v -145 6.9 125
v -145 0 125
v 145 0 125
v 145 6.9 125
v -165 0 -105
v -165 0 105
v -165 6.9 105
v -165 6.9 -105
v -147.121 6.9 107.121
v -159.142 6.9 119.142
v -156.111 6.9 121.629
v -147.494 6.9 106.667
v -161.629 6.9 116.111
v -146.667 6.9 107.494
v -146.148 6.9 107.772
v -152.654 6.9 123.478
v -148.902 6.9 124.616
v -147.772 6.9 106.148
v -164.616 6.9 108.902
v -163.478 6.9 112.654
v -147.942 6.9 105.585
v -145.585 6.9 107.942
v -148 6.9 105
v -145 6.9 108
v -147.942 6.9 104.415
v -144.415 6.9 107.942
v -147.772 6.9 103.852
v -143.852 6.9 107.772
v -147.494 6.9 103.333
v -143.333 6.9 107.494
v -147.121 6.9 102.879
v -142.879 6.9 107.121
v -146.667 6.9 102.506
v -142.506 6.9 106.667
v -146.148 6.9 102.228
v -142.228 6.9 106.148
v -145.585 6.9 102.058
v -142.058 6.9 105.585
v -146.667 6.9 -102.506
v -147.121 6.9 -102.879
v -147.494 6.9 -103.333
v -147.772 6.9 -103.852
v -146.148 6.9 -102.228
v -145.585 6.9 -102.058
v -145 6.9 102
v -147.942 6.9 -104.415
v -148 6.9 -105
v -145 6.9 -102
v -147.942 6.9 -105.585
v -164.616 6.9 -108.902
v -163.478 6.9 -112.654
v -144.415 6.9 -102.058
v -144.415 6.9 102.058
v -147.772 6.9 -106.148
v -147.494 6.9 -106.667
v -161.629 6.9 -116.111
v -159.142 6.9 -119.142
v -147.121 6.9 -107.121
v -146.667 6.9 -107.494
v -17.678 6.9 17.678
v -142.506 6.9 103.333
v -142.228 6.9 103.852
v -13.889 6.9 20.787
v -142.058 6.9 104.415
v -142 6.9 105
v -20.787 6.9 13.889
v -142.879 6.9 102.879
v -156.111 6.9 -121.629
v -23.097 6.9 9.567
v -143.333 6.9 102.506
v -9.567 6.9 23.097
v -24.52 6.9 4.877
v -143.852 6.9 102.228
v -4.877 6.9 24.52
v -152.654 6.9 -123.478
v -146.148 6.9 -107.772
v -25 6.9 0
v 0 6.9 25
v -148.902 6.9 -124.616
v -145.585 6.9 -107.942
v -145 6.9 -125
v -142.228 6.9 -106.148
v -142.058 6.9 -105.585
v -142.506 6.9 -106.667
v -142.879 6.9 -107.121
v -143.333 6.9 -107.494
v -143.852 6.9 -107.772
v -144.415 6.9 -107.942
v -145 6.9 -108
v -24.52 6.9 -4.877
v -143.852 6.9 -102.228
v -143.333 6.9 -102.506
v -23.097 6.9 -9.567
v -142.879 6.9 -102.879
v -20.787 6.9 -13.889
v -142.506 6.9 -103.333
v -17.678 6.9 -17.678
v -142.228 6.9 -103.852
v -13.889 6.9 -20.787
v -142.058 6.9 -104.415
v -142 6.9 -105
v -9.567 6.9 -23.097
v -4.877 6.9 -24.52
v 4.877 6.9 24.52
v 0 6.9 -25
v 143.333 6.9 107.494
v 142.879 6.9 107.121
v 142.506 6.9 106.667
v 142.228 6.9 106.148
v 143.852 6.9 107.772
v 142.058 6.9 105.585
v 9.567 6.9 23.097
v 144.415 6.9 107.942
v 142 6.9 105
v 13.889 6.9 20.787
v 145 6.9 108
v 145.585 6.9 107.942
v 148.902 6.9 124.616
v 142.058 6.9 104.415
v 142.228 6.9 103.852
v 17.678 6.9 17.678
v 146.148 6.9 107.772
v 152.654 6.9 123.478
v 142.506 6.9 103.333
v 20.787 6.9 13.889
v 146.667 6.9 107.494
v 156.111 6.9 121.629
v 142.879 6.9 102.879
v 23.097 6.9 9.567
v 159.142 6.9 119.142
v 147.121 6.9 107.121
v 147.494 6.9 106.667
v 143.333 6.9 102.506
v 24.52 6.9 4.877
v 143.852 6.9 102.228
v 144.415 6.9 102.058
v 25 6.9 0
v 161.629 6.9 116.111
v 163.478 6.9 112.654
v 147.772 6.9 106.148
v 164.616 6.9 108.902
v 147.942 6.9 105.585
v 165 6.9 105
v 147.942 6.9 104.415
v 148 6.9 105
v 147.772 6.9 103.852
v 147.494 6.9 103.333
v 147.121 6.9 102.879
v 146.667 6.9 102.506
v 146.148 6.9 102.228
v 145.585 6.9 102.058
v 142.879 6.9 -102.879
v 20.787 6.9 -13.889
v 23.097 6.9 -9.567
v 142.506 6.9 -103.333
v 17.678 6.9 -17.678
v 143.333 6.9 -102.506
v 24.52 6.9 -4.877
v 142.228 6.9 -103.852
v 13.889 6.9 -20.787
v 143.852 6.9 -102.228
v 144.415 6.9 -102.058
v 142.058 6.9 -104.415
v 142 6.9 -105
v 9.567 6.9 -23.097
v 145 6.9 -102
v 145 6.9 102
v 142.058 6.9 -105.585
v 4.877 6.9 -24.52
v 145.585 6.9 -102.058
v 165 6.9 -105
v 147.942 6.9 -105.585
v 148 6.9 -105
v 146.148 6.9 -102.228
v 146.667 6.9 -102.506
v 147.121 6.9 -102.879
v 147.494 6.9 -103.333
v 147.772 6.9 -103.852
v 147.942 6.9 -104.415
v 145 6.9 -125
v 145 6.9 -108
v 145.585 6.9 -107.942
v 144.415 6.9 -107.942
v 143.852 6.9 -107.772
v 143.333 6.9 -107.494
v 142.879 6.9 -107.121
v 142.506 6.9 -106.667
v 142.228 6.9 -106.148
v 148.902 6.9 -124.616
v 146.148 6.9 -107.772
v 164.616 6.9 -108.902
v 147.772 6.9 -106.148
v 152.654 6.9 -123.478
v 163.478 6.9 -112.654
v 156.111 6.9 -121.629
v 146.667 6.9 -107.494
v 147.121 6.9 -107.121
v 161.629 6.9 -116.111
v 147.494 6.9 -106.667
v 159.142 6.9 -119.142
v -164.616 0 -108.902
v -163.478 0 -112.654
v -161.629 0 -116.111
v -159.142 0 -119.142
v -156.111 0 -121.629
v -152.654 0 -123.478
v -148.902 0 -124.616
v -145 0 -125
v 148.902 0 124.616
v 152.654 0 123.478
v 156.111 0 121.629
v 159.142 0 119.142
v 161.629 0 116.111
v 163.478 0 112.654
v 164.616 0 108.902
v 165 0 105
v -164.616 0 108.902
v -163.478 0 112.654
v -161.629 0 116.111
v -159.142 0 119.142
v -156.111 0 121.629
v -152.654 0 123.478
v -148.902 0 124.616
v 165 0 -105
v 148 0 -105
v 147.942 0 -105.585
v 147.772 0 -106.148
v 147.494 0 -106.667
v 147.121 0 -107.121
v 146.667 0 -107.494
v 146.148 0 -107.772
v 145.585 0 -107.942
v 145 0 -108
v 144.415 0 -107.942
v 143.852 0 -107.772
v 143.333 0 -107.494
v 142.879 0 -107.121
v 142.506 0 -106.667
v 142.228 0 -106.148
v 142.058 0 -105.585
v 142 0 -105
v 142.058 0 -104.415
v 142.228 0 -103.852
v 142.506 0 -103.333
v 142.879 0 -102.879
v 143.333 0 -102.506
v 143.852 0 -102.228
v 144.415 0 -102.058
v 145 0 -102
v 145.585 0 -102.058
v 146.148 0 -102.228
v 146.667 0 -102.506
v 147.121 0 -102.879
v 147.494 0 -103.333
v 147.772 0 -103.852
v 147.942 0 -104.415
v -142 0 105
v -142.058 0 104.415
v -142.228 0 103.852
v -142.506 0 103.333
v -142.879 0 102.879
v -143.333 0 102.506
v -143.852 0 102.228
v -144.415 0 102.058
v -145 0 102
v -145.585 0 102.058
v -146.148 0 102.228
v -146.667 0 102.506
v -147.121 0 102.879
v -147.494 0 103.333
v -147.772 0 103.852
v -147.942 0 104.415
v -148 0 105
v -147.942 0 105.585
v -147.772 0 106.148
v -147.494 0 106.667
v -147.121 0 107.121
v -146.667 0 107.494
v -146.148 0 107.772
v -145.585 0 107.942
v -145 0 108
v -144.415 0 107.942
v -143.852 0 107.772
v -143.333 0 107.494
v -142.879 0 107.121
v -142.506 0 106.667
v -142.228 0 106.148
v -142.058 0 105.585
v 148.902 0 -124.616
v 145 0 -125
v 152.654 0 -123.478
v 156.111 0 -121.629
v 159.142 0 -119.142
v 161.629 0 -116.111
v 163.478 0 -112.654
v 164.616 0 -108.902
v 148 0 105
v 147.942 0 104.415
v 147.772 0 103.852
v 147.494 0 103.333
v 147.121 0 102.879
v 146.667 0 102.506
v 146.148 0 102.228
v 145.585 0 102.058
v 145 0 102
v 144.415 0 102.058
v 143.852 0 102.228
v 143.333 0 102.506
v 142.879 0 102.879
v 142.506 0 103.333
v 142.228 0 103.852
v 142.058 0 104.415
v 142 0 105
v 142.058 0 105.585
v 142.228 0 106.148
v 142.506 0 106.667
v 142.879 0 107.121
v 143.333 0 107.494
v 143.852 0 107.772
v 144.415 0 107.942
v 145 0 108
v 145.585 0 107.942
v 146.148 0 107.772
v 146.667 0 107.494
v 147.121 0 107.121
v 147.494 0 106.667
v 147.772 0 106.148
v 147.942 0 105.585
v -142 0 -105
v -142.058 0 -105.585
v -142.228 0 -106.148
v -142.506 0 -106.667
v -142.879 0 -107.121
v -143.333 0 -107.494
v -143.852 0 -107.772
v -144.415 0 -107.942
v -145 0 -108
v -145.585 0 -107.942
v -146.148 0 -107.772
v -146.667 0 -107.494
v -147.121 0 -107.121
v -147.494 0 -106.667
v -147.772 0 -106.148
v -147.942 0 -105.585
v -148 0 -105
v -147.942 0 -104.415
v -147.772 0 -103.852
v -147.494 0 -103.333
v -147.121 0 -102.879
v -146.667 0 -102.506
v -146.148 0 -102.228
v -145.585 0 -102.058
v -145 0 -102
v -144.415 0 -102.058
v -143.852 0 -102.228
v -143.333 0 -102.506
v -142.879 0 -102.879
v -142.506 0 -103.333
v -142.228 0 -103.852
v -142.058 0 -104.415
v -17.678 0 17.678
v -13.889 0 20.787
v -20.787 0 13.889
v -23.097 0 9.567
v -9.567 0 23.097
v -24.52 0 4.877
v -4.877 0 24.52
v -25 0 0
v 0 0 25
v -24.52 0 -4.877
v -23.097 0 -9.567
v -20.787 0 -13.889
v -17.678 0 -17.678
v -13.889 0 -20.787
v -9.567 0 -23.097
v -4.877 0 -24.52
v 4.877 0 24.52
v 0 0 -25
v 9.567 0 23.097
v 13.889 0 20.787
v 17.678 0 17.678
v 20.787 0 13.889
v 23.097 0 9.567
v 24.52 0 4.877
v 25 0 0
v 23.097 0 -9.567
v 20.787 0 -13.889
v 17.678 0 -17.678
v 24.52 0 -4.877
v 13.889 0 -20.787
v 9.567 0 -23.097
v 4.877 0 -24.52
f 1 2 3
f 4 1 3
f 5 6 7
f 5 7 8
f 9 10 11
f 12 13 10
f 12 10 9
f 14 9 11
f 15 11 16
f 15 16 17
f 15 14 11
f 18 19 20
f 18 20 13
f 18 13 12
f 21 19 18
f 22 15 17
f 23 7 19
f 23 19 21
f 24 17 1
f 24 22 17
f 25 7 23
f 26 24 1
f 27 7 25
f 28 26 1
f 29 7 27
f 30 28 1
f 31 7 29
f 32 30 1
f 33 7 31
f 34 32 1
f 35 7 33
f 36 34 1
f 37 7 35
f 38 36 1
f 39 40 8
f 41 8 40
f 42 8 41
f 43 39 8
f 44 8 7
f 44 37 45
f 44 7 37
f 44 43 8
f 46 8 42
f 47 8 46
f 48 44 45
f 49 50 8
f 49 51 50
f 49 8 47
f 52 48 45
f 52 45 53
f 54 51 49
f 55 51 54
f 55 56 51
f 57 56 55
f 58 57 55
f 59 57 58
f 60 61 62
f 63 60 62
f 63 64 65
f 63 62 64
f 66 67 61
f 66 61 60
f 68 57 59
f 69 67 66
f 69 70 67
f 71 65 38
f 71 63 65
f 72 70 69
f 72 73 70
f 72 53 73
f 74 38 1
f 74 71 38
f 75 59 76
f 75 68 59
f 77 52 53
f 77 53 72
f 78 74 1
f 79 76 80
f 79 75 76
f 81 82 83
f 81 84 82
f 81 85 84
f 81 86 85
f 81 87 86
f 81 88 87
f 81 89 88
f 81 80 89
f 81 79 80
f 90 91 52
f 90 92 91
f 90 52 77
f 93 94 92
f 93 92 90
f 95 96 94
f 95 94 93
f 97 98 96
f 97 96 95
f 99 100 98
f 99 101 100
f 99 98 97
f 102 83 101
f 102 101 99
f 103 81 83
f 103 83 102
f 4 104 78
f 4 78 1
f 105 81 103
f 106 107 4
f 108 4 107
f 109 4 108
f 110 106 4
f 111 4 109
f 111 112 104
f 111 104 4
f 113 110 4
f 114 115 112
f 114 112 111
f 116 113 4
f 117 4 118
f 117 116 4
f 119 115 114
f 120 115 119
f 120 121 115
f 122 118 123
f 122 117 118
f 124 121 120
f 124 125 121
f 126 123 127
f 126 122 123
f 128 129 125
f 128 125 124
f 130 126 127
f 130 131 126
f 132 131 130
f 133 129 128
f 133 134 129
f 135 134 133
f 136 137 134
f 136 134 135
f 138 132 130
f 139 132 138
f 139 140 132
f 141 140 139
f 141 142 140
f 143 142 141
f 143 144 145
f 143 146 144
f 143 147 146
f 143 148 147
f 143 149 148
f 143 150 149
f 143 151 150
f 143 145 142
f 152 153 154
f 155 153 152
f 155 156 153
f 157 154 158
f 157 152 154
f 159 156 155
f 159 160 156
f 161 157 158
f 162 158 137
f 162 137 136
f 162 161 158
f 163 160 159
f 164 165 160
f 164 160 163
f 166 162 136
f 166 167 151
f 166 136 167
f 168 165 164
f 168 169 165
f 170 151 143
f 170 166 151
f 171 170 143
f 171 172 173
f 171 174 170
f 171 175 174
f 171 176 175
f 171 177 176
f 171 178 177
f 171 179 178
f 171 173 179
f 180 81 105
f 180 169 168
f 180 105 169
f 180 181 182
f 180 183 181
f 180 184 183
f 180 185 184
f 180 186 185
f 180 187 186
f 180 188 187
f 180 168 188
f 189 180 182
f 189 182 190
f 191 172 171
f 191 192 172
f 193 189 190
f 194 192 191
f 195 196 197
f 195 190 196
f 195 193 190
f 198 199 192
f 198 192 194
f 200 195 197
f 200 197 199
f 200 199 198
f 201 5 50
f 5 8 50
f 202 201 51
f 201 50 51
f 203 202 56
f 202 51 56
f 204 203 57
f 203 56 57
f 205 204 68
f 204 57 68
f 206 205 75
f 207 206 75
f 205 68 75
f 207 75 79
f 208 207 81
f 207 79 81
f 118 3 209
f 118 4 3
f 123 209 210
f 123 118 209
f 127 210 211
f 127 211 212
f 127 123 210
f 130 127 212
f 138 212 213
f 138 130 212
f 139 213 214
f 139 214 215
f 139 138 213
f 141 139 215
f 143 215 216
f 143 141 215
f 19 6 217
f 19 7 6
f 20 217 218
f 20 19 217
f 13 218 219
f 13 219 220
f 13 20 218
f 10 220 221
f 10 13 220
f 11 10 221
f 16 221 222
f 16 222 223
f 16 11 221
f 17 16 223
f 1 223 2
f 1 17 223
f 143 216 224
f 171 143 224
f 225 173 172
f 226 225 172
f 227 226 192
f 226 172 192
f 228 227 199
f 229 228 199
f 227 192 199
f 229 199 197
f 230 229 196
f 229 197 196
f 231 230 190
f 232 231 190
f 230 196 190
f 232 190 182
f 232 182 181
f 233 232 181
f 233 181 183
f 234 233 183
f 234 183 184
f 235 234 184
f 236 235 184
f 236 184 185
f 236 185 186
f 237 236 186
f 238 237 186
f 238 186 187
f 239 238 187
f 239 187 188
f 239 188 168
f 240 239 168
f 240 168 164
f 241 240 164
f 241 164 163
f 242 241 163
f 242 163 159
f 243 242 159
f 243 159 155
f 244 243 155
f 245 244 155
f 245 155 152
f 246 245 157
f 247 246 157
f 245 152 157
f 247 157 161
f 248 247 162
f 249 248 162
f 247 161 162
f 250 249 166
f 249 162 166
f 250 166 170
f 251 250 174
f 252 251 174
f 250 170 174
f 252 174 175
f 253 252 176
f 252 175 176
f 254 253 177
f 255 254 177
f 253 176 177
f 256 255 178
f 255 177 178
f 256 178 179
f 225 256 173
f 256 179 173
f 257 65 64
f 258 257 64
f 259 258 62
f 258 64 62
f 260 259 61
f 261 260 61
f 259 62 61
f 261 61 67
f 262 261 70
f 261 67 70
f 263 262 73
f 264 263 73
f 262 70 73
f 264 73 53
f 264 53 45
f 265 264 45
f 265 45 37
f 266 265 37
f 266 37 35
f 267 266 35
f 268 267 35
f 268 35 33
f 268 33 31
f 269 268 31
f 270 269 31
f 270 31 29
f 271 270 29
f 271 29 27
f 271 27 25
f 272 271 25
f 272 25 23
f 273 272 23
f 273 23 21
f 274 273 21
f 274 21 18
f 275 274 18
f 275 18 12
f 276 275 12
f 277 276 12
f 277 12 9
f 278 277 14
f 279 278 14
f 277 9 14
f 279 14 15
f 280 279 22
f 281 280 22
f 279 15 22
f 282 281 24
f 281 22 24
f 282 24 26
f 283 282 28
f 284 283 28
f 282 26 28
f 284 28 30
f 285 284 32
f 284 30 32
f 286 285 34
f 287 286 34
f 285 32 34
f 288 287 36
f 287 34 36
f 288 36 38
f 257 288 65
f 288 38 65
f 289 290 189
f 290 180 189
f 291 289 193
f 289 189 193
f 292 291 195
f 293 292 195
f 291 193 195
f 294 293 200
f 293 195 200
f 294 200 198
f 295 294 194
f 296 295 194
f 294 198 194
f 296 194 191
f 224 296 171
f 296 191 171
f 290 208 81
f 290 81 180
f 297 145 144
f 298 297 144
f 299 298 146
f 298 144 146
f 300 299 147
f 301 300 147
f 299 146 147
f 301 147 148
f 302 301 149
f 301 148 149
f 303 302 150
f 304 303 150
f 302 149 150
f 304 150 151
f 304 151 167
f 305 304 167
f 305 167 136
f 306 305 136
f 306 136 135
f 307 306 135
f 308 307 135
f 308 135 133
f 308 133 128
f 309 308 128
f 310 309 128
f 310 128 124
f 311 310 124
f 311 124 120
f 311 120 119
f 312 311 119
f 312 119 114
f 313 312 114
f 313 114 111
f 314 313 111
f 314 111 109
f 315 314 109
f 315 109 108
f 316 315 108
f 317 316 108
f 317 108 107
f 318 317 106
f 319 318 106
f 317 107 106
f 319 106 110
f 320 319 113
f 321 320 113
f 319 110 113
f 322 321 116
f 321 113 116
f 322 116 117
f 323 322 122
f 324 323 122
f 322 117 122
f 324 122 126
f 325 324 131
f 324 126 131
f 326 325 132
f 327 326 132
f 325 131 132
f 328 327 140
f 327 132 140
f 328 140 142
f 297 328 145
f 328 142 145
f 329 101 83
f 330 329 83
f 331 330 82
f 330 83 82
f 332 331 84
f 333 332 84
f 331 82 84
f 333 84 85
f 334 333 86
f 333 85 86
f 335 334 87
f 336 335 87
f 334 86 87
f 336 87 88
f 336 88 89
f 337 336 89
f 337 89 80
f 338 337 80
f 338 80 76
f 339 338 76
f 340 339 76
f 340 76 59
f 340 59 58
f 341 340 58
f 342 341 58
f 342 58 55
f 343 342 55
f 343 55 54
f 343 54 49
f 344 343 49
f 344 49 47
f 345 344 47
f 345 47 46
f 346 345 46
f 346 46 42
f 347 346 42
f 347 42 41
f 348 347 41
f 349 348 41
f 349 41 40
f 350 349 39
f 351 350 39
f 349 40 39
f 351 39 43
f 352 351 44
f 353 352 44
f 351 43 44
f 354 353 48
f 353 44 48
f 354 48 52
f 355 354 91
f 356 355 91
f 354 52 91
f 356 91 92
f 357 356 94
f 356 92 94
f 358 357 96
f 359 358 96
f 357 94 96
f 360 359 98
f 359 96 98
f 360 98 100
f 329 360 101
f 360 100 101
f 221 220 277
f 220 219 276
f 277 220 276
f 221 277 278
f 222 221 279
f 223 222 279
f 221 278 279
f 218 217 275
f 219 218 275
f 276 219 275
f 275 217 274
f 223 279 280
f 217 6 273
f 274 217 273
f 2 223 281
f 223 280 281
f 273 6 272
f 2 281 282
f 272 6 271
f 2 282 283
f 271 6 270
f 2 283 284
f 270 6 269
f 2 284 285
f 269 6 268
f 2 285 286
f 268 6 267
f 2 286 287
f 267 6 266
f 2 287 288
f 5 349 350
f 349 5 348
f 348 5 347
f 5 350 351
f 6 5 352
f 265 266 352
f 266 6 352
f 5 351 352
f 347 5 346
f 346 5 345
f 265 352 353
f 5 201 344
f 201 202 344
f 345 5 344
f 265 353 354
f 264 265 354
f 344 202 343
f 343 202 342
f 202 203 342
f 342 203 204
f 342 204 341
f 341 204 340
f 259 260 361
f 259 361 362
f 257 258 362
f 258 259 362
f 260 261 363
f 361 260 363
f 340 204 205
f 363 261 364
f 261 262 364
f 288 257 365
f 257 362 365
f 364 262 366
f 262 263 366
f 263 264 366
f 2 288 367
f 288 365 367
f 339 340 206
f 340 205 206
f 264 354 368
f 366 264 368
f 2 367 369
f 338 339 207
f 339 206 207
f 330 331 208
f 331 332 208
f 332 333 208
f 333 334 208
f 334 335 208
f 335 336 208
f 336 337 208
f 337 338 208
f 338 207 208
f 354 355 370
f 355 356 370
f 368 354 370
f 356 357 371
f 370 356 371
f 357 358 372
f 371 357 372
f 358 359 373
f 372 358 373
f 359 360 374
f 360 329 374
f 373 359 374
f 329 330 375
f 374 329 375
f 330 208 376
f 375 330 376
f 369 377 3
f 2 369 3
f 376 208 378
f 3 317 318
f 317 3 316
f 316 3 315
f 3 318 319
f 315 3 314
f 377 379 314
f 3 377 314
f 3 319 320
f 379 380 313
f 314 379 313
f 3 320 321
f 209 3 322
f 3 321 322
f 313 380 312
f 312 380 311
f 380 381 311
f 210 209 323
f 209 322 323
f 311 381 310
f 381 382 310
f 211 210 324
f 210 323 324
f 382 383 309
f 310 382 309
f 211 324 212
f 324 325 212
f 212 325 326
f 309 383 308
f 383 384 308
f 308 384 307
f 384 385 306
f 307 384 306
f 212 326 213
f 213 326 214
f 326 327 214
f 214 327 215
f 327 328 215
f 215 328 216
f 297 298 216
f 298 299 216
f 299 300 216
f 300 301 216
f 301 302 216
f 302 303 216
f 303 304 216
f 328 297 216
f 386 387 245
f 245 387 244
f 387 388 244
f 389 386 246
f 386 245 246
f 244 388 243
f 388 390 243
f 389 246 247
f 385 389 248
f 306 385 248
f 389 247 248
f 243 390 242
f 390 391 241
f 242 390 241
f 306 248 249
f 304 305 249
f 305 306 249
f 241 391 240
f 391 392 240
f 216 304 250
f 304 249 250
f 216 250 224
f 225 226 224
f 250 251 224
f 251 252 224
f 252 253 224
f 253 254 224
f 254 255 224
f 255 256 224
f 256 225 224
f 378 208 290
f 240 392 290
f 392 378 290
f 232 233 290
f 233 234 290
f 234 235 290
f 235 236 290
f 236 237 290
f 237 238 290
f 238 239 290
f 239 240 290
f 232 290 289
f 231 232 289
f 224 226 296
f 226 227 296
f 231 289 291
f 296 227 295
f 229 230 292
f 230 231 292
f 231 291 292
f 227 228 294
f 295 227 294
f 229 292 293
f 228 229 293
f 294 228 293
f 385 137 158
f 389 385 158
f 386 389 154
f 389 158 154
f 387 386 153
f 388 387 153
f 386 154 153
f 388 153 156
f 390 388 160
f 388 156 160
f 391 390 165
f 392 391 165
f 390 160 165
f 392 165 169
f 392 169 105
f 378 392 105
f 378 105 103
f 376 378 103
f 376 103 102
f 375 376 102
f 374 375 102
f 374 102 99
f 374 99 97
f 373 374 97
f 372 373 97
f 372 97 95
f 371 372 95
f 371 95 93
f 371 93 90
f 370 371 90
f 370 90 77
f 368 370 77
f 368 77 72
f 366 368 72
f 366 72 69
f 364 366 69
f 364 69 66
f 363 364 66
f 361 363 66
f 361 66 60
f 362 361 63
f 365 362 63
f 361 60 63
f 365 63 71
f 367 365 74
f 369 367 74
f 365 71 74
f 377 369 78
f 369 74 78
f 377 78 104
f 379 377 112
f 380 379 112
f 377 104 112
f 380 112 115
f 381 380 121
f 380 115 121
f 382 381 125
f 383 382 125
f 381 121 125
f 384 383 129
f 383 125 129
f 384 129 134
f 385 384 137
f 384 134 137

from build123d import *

# Parameters (mm, degrees)
SKETCH1_W           = 330
SKETCH1_H           = 250
BOSS_EXTRUDE1_DEPTH = 6.9
SKETCH2_R           = 3
CUT_EXTRUDE1_DEPTH  = 7.9
SKETCH3_R           = 25
CUT_EXTRUDE2_DEPTH  = 7.9
FILLET1_R           = 20


with BuildPart() as part:
    # Sketch1 → Boss-Extrude1 (new body)
    with BuildSketch(Plane(origin=(0, 0, 0), x_dir=(1, 0, 0), z_dir=(0, 1, 0))):
        Rectangle(SKETCH1_W, SKETCH1_H)
    extrude(amount=BOSS_EXTRUDE1_DEPTH)

    # Sketch2 → Cut-Extrude1 (cut, through all)
    with BuildSketch(Plane(origin=(0, 6.9, 0), x_dir=(1, 0, 0), z_dir=(0, 1, 0))):
        with Locations((-145, 105)):
            Circle(SKETCH2_R)
        with Locations((145, 105)):
            Circle(SKETCH2_R)
        with Locations((145, -105)):
            Circle(SKETCH2_R)
        with Locations((-145, -105)):
            Circle(SKETCH2_R)
    extrude(amount=-CUT_EXTRUDE1_DEPTH, mode=Mode.SUBTRACT)

    # Sketch3 → Cut-Extrude2 (cut, through all)
    with BuildSketch(Plane(origin=(0, 6.9, 0), x_dir=(1, 0, 0), z_dir=(0, 1, 0))):
        Circle(SKETCH3_R)
    extrude(amount=-CUT_EXTRUDE2_DEPTH, mode=Mode.SUBTRACT)

    # Fillet1
    fillet1_edges = [part.edges().sort_by_distance(p)[0] for p in [
        (-165, 3.45, -125),
        (165, 3.45, -125),
        (165, 3.45, 125),
        (-165, 3.45, 125),
    ]]
    fillet(fillet1_edges, radius=FILLET1_R)


solid = part.part
